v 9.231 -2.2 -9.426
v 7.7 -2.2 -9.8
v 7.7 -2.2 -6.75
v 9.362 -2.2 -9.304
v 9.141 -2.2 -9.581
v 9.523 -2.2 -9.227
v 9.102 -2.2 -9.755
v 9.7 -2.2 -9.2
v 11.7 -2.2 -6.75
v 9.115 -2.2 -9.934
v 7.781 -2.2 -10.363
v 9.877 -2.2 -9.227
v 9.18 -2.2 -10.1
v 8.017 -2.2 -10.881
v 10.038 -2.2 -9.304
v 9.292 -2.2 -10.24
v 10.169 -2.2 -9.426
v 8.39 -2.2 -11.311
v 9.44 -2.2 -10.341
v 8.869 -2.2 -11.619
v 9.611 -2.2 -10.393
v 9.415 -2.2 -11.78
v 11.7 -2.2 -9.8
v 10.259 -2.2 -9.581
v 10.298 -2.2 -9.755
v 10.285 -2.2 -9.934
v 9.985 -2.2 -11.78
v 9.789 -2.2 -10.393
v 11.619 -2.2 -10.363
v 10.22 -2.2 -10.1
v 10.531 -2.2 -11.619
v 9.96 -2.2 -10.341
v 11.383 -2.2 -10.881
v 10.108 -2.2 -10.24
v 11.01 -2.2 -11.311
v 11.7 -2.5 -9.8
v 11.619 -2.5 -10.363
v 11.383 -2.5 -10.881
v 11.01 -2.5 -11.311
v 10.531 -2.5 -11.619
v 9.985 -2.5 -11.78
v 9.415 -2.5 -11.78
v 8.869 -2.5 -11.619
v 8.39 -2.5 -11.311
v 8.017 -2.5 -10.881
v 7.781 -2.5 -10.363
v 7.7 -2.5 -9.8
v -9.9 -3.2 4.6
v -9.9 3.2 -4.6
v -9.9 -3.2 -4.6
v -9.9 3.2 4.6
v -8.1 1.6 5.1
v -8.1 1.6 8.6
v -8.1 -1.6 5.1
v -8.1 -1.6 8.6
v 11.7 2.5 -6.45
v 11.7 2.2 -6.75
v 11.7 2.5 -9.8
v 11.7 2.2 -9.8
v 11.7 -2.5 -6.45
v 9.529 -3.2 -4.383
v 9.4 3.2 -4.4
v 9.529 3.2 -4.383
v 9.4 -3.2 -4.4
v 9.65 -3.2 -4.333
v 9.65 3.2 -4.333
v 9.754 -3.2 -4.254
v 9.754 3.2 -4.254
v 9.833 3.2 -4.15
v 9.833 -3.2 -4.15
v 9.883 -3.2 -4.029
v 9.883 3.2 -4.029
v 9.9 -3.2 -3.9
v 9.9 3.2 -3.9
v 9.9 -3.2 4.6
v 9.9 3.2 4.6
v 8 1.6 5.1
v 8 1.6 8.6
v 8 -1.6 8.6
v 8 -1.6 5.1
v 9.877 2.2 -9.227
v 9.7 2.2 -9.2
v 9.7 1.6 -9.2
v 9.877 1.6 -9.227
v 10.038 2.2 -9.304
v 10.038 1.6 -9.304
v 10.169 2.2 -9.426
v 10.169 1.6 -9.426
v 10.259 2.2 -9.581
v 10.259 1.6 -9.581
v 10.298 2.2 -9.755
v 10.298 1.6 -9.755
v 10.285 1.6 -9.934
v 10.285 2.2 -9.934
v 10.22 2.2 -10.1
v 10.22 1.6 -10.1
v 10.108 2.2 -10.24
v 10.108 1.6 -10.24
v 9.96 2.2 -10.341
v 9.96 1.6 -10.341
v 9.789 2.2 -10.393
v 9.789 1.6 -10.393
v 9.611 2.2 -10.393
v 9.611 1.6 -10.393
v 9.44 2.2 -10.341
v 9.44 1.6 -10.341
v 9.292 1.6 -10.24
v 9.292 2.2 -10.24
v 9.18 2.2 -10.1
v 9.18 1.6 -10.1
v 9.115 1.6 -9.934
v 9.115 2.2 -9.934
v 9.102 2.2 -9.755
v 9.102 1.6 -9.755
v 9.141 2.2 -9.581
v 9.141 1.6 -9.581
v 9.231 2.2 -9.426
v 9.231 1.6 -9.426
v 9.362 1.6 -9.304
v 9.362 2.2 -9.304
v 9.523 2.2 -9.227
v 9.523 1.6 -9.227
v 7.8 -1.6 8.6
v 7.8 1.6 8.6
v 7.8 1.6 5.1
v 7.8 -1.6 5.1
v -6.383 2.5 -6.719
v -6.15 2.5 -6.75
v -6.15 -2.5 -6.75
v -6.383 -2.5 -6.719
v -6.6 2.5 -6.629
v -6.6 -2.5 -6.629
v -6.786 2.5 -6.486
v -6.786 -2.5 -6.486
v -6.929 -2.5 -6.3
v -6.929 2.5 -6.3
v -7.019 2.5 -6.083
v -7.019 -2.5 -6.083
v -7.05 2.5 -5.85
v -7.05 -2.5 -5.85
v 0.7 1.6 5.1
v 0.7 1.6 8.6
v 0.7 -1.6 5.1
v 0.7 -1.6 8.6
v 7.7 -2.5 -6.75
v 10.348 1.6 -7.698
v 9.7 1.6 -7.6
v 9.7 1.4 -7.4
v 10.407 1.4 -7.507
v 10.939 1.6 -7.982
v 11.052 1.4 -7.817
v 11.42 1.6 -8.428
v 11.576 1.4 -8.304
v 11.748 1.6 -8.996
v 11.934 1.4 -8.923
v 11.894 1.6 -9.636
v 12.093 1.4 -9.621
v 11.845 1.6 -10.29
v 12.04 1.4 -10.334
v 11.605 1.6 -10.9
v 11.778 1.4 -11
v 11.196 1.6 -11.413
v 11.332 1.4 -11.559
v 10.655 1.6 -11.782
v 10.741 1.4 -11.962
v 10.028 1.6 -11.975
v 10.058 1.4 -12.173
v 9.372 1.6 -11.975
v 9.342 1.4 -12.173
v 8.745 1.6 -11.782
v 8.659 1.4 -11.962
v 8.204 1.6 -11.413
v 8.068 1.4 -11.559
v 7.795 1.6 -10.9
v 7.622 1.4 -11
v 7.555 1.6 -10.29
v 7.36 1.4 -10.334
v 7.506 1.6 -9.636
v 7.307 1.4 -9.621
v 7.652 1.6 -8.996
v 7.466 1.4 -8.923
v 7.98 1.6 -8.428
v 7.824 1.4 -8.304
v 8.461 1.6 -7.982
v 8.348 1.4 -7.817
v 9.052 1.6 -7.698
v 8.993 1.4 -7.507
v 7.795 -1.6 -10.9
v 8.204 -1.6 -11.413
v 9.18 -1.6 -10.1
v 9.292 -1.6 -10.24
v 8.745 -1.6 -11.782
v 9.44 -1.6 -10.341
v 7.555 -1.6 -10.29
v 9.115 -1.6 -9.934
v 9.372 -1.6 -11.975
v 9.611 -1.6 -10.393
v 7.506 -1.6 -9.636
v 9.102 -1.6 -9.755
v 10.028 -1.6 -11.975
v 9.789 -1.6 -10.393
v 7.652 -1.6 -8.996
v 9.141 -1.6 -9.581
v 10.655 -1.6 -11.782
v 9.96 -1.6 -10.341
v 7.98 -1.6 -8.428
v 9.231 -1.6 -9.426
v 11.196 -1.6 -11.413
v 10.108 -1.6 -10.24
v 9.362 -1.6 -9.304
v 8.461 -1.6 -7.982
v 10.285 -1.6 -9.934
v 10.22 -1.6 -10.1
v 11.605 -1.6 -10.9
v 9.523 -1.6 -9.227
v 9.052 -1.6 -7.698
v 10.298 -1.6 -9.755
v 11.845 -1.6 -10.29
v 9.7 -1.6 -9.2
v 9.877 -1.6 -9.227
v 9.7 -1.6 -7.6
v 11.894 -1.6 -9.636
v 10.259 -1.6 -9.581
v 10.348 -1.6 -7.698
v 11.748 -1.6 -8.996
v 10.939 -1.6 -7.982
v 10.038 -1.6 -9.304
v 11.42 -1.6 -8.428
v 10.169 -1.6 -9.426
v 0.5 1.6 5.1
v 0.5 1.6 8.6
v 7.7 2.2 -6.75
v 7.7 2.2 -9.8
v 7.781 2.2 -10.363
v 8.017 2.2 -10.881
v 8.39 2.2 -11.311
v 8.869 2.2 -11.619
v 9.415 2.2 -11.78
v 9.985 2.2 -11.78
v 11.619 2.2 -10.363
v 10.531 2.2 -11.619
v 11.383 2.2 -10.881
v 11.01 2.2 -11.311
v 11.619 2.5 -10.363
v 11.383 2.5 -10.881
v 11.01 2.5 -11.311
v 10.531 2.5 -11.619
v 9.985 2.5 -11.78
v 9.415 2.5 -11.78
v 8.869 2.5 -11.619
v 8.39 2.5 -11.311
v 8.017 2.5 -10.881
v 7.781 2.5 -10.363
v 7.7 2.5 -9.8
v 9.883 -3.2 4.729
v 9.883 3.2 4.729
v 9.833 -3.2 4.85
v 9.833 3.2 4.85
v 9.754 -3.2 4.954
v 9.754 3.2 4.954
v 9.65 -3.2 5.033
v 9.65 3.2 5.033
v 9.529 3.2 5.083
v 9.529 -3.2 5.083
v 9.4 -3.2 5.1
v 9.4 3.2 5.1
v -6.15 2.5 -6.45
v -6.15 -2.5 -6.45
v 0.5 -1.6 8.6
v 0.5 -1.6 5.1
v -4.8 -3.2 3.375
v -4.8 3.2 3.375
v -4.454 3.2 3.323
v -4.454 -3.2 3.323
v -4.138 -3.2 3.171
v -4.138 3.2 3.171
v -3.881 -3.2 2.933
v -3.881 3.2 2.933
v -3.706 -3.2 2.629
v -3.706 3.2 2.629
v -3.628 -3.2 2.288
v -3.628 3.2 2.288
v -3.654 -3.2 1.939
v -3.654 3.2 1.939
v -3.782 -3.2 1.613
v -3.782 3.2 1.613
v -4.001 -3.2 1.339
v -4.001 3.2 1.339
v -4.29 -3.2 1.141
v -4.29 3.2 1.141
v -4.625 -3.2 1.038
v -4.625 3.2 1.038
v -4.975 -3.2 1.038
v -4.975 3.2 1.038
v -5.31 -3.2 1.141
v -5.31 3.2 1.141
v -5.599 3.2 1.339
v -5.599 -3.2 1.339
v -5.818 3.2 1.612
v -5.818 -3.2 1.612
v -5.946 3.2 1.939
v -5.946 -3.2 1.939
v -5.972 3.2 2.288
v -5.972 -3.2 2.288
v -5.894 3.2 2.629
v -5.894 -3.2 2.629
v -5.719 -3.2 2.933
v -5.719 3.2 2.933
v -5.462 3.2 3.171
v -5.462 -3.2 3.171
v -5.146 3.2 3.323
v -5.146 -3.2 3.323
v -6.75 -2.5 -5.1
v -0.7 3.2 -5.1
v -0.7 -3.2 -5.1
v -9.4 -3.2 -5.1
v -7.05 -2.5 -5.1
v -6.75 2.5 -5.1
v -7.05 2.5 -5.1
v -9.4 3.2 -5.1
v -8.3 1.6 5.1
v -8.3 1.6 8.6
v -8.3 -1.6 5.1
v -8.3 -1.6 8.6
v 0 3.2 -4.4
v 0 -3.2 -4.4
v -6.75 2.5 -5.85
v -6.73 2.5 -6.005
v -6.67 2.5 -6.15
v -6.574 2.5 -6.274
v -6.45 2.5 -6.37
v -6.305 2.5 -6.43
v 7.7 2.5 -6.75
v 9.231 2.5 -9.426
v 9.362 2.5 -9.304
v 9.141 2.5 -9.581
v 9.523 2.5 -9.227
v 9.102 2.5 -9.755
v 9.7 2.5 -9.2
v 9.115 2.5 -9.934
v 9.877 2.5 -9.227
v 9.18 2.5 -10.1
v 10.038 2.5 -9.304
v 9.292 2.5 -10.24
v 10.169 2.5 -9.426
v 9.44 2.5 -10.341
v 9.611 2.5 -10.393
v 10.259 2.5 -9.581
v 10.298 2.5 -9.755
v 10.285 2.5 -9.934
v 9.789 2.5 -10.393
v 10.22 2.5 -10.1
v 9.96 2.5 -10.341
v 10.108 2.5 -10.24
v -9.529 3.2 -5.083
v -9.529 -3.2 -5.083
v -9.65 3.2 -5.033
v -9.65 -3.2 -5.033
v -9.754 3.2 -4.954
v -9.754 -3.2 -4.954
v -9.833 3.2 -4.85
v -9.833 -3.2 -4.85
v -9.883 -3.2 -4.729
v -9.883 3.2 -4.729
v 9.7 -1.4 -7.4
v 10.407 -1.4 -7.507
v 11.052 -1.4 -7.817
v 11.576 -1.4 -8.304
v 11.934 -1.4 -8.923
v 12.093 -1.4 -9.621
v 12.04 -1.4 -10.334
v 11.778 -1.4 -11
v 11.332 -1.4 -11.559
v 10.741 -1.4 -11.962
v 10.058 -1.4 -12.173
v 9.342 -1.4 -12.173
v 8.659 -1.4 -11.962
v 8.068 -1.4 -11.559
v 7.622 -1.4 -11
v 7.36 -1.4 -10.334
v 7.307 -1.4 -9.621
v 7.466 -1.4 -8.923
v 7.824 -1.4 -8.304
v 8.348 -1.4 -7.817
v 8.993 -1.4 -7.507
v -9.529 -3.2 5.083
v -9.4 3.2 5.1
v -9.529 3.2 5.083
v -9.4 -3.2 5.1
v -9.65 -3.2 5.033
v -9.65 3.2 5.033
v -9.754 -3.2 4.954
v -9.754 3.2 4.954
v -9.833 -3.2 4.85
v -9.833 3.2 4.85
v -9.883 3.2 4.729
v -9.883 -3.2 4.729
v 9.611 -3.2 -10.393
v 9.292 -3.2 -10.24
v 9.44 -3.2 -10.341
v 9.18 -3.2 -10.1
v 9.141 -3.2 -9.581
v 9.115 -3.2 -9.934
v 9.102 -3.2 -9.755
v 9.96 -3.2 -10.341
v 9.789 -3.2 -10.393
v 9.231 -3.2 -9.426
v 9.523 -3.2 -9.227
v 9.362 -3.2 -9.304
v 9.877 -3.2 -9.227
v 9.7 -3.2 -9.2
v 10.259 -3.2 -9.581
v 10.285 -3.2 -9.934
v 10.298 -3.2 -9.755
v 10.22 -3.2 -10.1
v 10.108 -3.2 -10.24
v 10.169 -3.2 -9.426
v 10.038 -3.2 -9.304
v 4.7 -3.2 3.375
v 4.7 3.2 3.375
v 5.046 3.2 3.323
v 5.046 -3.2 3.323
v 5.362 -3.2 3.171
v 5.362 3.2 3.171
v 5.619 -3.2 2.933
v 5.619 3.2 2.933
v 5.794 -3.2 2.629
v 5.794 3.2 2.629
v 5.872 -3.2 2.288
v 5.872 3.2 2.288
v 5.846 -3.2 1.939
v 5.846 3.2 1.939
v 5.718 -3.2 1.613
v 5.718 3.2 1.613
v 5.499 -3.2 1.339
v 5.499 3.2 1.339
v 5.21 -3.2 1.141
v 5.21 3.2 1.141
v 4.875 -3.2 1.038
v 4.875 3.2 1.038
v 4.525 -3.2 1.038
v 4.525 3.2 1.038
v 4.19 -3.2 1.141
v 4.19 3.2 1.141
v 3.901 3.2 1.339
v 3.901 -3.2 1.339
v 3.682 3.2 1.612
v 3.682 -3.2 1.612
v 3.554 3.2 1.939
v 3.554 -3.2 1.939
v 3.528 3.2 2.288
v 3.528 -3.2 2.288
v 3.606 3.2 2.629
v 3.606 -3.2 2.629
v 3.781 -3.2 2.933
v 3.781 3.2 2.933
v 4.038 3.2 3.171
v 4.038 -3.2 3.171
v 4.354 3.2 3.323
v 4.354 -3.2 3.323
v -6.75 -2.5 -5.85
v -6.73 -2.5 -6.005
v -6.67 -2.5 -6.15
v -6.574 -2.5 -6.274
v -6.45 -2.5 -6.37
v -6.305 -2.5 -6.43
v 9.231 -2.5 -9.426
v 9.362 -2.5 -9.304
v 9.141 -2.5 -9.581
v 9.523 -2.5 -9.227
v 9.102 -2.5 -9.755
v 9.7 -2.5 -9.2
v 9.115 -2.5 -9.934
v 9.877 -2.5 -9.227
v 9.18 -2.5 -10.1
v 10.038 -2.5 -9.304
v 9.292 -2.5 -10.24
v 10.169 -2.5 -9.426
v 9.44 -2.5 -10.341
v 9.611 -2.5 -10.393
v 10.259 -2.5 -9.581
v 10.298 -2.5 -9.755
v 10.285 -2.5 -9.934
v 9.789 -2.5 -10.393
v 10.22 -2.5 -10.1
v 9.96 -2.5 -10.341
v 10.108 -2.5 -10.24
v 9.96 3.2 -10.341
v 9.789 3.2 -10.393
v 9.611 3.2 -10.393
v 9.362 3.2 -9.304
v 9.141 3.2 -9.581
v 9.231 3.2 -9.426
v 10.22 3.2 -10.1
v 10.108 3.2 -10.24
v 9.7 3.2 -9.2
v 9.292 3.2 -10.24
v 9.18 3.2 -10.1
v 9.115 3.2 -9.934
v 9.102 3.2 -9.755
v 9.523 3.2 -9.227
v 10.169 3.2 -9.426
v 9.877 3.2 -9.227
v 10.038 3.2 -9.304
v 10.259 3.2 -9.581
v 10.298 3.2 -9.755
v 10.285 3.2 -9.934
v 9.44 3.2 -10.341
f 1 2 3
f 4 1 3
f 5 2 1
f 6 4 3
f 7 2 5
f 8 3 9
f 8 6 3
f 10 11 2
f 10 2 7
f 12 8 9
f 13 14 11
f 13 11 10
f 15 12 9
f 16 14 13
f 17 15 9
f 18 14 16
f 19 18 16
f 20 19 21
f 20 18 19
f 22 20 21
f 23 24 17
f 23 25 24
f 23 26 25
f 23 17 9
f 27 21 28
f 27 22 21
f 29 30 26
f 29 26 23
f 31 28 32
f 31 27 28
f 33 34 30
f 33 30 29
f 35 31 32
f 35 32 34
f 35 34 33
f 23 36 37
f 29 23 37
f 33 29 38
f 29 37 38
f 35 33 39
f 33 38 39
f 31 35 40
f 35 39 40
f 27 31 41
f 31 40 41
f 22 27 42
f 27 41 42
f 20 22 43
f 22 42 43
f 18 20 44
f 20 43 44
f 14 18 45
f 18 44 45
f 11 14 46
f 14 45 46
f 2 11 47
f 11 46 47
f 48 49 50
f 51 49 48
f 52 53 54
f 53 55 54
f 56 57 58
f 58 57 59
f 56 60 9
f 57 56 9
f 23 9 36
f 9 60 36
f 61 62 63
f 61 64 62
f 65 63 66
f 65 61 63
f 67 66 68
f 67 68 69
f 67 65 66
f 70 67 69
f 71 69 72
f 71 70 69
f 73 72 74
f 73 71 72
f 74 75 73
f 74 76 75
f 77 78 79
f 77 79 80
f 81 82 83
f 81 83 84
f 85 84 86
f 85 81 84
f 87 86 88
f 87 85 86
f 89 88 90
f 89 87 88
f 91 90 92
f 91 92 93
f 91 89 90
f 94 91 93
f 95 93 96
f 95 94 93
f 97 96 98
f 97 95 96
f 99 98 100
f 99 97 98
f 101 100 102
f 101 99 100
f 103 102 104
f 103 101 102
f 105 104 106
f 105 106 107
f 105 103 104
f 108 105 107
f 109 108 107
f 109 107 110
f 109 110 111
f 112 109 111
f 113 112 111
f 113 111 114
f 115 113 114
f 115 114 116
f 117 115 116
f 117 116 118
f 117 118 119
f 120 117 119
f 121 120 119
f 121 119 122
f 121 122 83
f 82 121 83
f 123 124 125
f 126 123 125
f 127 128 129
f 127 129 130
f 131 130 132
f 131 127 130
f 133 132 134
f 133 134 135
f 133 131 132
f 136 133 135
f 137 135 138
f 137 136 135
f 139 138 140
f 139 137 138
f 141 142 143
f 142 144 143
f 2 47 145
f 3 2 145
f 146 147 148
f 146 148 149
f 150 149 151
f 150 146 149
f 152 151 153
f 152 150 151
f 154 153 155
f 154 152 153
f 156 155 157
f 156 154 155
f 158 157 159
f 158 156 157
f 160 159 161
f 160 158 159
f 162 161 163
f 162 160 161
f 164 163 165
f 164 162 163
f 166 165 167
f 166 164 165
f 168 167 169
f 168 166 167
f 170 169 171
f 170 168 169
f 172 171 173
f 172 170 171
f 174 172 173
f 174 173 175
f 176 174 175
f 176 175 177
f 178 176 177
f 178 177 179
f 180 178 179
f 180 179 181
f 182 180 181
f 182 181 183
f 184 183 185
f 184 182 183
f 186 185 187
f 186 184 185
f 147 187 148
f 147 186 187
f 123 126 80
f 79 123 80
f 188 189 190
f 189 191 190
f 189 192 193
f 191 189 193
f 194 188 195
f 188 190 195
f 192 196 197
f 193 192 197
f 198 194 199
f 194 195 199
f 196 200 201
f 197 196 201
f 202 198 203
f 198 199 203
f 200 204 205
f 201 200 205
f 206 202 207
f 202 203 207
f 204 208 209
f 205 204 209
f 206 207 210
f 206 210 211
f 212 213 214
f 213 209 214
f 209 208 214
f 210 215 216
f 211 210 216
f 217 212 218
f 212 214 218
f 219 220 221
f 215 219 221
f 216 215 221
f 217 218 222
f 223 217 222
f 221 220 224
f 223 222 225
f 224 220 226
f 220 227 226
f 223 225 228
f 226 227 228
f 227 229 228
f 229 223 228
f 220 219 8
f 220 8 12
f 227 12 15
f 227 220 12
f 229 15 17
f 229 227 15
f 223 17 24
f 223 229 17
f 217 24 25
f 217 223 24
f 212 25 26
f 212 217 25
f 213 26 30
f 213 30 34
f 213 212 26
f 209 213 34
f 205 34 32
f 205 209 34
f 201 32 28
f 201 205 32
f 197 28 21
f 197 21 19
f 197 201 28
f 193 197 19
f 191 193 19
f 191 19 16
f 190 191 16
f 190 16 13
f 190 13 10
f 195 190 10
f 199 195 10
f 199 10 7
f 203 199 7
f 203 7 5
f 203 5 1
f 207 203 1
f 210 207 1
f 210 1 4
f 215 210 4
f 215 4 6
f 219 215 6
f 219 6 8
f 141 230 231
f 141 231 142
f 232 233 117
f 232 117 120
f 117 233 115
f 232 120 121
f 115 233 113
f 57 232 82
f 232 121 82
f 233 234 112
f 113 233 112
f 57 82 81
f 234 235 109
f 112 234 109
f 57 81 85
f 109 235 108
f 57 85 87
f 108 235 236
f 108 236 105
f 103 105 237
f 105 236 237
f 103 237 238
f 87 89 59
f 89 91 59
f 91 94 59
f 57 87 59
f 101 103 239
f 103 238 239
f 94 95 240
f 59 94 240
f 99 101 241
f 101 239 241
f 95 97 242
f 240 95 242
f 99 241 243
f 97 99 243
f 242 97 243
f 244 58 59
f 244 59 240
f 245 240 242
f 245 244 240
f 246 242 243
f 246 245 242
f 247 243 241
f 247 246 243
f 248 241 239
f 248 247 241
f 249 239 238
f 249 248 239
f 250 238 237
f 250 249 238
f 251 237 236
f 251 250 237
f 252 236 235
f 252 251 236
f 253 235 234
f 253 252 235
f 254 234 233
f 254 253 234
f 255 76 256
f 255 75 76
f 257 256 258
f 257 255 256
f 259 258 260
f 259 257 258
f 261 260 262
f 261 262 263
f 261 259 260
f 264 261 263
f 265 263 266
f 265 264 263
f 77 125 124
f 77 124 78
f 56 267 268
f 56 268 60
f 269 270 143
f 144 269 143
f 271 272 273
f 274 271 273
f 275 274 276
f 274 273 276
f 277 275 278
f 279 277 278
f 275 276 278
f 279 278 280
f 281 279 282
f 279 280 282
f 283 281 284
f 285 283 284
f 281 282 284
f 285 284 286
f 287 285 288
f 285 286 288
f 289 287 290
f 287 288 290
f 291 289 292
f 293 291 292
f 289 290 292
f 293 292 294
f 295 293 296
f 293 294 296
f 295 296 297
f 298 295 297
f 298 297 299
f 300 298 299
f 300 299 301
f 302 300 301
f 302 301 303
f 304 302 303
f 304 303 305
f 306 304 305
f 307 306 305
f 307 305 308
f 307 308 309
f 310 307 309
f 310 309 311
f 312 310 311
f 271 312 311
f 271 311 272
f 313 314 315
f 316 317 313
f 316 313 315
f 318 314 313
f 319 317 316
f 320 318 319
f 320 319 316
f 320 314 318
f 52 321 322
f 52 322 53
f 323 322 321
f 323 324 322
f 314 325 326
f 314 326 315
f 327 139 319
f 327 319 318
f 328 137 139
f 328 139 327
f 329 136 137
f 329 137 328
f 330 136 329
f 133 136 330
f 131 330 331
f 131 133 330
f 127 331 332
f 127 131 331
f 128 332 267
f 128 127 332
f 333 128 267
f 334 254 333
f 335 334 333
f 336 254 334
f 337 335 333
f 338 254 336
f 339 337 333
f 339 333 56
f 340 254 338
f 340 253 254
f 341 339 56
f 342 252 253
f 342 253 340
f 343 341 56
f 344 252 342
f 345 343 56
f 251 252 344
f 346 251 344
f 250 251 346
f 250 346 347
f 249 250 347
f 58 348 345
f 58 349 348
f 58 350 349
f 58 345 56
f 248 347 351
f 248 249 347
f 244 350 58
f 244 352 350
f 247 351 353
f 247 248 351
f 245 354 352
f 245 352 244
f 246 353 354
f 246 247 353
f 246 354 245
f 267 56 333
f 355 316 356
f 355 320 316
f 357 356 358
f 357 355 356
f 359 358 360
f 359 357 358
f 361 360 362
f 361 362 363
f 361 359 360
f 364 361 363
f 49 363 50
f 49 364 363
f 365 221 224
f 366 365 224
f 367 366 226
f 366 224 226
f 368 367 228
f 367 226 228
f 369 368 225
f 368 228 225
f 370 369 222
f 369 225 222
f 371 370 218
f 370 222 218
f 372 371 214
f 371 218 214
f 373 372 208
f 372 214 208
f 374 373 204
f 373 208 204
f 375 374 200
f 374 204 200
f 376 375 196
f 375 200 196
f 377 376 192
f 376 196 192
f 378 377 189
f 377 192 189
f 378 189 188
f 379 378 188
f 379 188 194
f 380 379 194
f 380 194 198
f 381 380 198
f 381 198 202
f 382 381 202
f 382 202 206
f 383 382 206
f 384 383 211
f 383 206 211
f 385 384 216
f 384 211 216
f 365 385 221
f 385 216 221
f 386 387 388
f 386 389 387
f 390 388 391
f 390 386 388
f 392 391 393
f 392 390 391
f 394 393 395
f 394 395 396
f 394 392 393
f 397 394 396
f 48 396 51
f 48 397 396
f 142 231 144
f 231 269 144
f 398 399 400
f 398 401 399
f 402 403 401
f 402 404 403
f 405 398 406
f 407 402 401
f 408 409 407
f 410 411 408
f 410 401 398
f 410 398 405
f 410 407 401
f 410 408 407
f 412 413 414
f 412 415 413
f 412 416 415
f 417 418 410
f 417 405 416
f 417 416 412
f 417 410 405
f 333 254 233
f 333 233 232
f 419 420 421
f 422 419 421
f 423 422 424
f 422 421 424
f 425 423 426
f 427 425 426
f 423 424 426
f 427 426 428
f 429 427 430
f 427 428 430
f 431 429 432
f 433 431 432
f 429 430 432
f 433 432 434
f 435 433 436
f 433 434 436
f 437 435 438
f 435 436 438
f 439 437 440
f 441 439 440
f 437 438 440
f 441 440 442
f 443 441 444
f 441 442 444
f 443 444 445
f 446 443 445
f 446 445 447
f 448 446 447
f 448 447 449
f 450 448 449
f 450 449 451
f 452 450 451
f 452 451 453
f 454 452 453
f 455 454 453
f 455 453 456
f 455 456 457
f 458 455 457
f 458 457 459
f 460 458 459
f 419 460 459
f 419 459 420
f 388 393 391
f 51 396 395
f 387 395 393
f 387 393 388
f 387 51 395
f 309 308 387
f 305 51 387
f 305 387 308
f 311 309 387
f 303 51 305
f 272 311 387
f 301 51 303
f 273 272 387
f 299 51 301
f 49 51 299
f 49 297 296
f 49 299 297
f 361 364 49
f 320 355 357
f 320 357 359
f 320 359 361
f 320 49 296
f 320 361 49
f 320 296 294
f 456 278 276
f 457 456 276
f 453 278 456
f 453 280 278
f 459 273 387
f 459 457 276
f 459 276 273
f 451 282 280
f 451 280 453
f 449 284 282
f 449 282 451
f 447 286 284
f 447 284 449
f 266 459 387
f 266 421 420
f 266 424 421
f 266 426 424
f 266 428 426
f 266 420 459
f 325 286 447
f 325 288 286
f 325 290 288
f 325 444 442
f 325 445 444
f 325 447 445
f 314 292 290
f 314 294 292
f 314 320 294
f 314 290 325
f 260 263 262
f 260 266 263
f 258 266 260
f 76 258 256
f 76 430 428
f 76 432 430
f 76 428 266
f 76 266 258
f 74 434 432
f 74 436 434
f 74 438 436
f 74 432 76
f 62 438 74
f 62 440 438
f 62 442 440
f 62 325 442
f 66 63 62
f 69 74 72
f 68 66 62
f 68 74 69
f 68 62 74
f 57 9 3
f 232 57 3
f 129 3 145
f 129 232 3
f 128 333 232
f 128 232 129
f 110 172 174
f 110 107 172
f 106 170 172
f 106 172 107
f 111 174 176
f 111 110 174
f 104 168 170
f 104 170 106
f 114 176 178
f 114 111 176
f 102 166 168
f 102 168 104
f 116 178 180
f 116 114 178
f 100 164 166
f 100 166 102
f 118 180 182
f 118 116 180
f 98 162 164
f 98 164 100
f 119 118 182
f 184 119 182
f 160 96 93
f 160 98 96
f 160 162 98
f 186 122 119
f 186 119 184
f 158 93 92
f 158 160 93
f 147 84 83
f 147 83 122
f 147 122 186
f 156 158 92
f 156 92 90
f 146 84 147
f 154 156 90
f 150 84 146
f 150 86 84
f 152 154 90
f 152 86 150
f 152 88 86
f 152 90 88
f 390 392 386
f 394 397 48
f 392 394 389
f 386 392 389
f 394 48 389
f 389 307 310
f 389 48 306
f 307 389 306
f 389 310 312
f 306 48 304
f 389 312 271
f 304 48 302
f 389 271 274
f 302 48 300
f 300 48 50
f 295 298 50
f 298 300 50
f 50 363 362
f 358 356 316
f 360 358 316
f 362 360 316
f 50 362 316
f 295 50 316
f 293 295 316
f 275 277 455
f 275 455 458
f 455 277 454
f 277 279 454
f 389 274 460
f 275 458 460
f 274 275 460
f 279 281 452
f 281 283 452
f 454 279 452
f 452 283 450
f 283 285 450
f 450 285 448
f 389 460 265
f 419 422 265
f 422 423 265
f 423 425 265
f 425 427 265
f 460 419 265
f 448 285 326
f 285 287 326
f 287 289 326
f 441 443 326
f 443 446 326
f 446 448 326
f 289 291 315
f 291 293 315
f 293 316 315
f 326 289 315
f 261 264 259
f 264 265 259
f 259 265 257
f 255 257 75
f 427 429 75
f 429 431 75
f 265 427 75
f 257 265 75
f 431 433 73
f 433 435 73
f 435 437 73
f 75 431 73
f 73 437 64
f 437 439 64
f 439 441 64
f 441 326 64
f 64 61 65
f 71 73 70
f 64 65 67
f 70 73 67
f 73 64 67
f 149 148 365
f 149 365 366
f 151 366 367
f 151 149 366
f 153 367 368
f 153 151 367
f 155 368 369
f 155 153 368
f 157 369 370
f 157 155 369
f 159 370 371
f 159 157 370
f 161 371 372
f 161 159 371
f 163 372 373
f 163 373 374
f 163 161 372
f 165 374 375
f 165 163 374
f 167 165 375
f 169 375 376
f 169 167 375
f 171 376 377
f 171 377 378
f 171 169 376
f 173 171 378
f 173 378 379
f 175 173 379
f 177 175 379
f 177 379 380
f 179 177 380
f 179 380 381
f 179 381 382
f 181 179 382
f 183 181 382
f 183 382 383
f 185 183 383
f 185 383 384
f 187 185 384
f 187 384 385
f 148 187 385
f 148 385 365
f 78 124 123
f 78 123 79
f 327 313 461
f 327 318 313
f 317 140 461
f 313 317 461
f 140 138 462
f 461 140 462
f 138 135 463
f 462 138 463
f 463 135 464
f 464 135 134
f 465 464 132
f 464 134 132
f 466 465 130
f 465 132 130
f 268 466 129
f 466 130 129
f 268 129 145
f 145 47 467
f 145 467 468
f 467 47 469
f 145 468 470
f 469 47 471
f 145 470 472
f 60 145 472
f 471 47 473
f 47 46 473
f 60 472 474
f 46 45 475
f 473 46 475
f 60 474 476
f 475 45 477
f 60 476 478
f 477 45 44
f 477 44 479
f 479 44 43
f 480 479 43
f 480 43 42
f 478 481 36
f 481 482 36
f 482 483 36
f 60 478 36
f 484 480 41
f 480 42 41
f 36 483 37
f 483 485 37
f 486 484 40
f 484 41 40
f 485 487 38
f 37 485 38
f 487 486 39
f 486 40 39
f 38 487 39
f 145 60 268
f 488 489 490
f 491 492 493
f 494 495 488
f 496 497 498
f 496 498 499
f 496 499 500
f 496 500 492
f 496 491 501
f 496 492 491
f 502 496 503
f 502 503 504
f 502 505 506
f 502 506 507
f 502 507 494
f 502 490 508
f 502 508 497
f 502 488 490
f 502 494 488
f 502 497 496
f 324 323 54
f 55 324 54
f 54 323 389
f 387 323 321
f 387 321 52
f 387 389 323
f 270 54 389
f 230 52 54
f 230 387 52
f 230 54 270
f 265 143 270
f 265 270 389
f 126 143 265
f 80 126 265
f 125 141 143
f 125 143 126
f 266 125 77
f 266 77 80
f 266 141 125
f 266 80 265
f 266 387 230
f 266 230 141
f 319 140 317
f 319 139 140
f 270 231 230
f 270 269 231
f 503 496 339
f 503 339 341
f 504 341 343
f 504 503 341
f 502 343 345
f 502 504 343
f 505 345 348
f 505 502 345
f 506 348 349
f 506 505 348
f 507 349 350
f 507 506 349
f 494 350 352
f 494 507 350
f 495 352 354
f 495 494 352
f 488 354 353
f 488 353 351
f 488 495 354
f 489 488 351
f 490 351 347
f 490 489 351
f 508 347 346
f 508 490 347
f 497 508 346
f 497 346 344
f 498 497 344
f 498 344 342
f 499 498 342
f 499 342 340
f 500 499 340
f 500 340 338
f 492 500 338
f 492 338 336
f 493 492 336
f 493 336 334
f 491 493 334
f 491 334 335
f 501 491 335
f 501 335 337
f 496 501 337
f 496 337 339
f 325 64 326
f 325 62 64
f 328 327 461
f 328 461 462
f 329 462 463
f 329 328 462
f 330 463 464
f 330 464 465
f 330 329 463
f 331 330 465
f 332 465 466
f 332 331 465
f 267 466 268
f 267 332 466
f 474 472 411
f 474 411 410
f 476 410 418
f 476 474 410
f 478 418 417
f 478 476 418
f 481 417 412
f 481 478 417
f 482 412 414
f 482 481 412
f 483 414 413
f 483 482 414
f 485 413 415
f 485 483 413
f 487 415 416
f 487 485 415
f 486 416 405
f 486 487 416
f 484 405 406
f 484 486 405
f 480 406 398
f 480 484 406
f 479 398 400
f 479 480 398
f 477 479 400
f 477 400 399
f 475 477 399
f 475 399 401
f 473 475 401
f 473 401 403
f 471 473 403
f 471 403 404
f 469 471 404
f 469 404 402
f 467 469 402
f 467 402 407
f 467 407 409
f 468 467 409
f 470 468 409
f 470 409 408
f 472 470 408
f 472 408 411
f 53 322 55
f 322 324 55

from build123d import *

# Parameters (mm, degrees)
EXTRUDE_1_DEPTH     = 3.2
CUT_EXTRUDE_1_REACH = 14.844
SKETCH_2_R          = 1.175
FILLET_1_R          = 0.5
EXTRUDE_1_2_DEPTH   = 2.5
EXTRUDE_2_DEPTH     = 0.3
EXTRUDE_3_REACH     = 19.807
SKETCH_5_R          = 0.6
SKETCH_6_R          = 2.4
EXTRUDE_4_DEPTH     = 1.6
CHAMFER_1_SIZE      = 0.2
SKETCH_7_W          = 0.2
SKETCH_7_H          = 3.5
EXTRUDE_2_2_DEPTH   = 1.6


with BuildPart() as part:
    # 草图1 → Extrude 1 (new, symmetric)
    with BuildSketch(Plane(origin=(0, 0, 0), x_dir=(1, 0, 0), z_dir=(0, 1, 0))):
        Polygon((9.9, 4.4), (0, 4.4), (-0.7, 5.1), (-9.9, 5.1), (-9.9, -5.1), (9.9, -5.1), align=None)
    extrude(amount=EXTRUDE_1_DEPTH, both=True)

    # 草图2 → 切除-拉伸1 (cut, up to next)
    with BuildSketch(Plane(origin=(0, 3.2, 0), x_dir=(1, 0, 0), z_dir=(0, 1, 0)), mode=Mode.PRIVATE) as cut_extrude_1_sk1:
        with Locations(Location((-4.8, -2.2, 0), (0, 0, 270))):
            Circle(SKETCH_2_R)
    cut_extrude_1_tool1 = extrude(cut_extrude_1_sk1.sketch, amount=-CUT_EXTRUDE_1_REACH, mode=Mode.PRIVATE) & part.part
    # 草图2 → 切除-拉伸1 (cut, up to next)
    with BuildSketch(Plane(origin=(0, 3.2, 0), x_dir=(1, 0, 0), z_dir=(0, 1, 0)), mode=Mode.PRIVATE) as cut_extrude_1_sk2:
        with Locations(Location((4.7, -2.2, 0), (0, 0, 270))):
            Circle(SKETCH_2_R)
    cut_extrude_1_tool2 = extrude(cut_extrude_1_sk2.sketch, amount=-CUT_EXTRUDE_1_REACH, mode=Mode.PRIVATE) & part.part
    add(cut_extrude_1_tool1.solids().sort_by_distance((-4.8, 3.2, 2.2))[0], mode=Mode.SUBTRACT)
    add(cut_extrude_1_tool2.solids().sort_by_distance((4.7, 3.2, 2.2))[0], mode=Mode.SUBTRACT)

    # 圆角1
    fillet_1_edges = [part.edges().sort_by_distance(p)[0] for p in [
        (9.9, 0, 5.1),
        (-9.9, 0, 5.1),
        (-9.9, 0, -5.1),
        (9.9, 0, -4.4),
    ]]
    fillet(fillet_1_edges, radius=FILLET_1_R)

    # 草图3 → Extrude 1 2 (add, symmetric)
    with BuildSketch(Plane(origin=(0, 0, 0), x_dir=(1, 0, 0), z_dir=(0, 1, 0))):
        with BuildLine():
            Line((-6.75, 5.1), (-6.75, 5.85))
            ThreePointArc((-6.75, 5.85), (-6.574264069, 6.274264069), (-6.15, 6.45))
            Line((-6.15, 6.45), (11.7, 6.45))
            Line((11.7, 6.45), (11.7, 6.75))
            Line((11.7, 6.75), (-6.15, 6.75))
            ThreePointArc((-6.15, 6.75), (-6.786396103, 6.486396103), (-7.05, 5.85))
            Line((-7.05, 5.85), (-7.05, 5.1))
            Line((-7.05, 5.1), (-6.75, 5.1))
        make_face()
    extrude(amount=EXTRUDE_1_2_DEPTH, both=True)

    # 草图4 → Extrude 2 (add)
    with BuildSketch(Plane(origin=(0, 2.5, 0), x_dir=(1, 0, 0), z_dir=(0, 1, 0))):
        with BuildLine():
            Line((7.7, 9.8), (7.7, 6.45))
            Line((7.7, 6.45), (11.7, 6.45))
            Line((11.7, 6.45), (11.7, 9.8))
            ThreePointArc((11.7, 9.8), (9.7, 11.8), (7.7, 9.8))
        make_face()
    extrude_2 = extrude(amount=-EXTRUDE_2_DEPTH)

    # 镜向1: Extrude 2 across plane
    add(extrude_2.mirror(Plane.ZX))

    # 凸台-拉伸3: up to this face of the body (flat: up to its plane)
    extrude_3_end = Plane(part.part.faces().sort_by_distance((-0.181890176, -3.2, 0.080625265))[0])
    # 草图5 → 凸台-拉伸3 (add, up to the picked face)
    with BuildSketch(Plane(origin=(0, 3.2, 0), x_dir=(1, 0, 0), z_dir=(0, 1, 0)), mode=Mode.PRIVATE) as extrude_3_sk1:
        with Locations(Location((9.7, 9.8, 0), (0, 0, 270))):
            Circle(SKETCH_5_R)
    extrude_3_tool1 = split(extrude(extrude_3_sk1.sketch, amount=-EXTRUDE_3_REACH, mode=Mode.PRIVATE), bisect_by=extrude_3_end, keep=Keep.BOTH, mode=Mode.PRIVATE)
    add(extrude_3_tool1.solids().sort_by(Axis((9.7, 3.2, -9.8), (0, -1, 0)))[0])

    # 草图6 → 凸台-拉伸4 (add, symmetric)
    with BuildSketch(Plane(origin=(0, 0, 0), x_dir=(1, 0, 0), z_dir=(0, 1, 0))):
        with Locations(Location((9.7, 9.8, 0), (0, 0, 270))):
            Circle(SKETCH_6_R)
    extrude(amount=EXTRUDE_4_DEPTH, both=True)

    # 倒角1
    chamfer_1_edges = [part.edges().sort_by_distance(p)[0] for p in [
        (9.7, -1.6, -12.2),
        (9.7, 1.6, -12.2),
    ]]
    chamfer(chamfer_1_edges, length=CHAMFER_1_SIZE)

    # 草图7 → Extrude 2 2 (add, symmetric)
    with BuildSketch(Plane(origin=(0, 0, 0), x_dir=(1, 0, 0), z_dir=(0, 1, 0))):
        with Locations((-8.2, -6.85)):
            Rectangle(SKETCH_7_W, SKETCH_7_H)
        with Locations((0.6, -6.85)):
            Rectangle(SKETCH_7_W, SKETCH_7_H)
        with Locations((7.9, -6.85)):
            Rectangle(SKETCH_7_W, SKETCH_7_H)
    extrude(amount=EXTRUDE_2_2_DEPTH, both=True)


solid = part.part
